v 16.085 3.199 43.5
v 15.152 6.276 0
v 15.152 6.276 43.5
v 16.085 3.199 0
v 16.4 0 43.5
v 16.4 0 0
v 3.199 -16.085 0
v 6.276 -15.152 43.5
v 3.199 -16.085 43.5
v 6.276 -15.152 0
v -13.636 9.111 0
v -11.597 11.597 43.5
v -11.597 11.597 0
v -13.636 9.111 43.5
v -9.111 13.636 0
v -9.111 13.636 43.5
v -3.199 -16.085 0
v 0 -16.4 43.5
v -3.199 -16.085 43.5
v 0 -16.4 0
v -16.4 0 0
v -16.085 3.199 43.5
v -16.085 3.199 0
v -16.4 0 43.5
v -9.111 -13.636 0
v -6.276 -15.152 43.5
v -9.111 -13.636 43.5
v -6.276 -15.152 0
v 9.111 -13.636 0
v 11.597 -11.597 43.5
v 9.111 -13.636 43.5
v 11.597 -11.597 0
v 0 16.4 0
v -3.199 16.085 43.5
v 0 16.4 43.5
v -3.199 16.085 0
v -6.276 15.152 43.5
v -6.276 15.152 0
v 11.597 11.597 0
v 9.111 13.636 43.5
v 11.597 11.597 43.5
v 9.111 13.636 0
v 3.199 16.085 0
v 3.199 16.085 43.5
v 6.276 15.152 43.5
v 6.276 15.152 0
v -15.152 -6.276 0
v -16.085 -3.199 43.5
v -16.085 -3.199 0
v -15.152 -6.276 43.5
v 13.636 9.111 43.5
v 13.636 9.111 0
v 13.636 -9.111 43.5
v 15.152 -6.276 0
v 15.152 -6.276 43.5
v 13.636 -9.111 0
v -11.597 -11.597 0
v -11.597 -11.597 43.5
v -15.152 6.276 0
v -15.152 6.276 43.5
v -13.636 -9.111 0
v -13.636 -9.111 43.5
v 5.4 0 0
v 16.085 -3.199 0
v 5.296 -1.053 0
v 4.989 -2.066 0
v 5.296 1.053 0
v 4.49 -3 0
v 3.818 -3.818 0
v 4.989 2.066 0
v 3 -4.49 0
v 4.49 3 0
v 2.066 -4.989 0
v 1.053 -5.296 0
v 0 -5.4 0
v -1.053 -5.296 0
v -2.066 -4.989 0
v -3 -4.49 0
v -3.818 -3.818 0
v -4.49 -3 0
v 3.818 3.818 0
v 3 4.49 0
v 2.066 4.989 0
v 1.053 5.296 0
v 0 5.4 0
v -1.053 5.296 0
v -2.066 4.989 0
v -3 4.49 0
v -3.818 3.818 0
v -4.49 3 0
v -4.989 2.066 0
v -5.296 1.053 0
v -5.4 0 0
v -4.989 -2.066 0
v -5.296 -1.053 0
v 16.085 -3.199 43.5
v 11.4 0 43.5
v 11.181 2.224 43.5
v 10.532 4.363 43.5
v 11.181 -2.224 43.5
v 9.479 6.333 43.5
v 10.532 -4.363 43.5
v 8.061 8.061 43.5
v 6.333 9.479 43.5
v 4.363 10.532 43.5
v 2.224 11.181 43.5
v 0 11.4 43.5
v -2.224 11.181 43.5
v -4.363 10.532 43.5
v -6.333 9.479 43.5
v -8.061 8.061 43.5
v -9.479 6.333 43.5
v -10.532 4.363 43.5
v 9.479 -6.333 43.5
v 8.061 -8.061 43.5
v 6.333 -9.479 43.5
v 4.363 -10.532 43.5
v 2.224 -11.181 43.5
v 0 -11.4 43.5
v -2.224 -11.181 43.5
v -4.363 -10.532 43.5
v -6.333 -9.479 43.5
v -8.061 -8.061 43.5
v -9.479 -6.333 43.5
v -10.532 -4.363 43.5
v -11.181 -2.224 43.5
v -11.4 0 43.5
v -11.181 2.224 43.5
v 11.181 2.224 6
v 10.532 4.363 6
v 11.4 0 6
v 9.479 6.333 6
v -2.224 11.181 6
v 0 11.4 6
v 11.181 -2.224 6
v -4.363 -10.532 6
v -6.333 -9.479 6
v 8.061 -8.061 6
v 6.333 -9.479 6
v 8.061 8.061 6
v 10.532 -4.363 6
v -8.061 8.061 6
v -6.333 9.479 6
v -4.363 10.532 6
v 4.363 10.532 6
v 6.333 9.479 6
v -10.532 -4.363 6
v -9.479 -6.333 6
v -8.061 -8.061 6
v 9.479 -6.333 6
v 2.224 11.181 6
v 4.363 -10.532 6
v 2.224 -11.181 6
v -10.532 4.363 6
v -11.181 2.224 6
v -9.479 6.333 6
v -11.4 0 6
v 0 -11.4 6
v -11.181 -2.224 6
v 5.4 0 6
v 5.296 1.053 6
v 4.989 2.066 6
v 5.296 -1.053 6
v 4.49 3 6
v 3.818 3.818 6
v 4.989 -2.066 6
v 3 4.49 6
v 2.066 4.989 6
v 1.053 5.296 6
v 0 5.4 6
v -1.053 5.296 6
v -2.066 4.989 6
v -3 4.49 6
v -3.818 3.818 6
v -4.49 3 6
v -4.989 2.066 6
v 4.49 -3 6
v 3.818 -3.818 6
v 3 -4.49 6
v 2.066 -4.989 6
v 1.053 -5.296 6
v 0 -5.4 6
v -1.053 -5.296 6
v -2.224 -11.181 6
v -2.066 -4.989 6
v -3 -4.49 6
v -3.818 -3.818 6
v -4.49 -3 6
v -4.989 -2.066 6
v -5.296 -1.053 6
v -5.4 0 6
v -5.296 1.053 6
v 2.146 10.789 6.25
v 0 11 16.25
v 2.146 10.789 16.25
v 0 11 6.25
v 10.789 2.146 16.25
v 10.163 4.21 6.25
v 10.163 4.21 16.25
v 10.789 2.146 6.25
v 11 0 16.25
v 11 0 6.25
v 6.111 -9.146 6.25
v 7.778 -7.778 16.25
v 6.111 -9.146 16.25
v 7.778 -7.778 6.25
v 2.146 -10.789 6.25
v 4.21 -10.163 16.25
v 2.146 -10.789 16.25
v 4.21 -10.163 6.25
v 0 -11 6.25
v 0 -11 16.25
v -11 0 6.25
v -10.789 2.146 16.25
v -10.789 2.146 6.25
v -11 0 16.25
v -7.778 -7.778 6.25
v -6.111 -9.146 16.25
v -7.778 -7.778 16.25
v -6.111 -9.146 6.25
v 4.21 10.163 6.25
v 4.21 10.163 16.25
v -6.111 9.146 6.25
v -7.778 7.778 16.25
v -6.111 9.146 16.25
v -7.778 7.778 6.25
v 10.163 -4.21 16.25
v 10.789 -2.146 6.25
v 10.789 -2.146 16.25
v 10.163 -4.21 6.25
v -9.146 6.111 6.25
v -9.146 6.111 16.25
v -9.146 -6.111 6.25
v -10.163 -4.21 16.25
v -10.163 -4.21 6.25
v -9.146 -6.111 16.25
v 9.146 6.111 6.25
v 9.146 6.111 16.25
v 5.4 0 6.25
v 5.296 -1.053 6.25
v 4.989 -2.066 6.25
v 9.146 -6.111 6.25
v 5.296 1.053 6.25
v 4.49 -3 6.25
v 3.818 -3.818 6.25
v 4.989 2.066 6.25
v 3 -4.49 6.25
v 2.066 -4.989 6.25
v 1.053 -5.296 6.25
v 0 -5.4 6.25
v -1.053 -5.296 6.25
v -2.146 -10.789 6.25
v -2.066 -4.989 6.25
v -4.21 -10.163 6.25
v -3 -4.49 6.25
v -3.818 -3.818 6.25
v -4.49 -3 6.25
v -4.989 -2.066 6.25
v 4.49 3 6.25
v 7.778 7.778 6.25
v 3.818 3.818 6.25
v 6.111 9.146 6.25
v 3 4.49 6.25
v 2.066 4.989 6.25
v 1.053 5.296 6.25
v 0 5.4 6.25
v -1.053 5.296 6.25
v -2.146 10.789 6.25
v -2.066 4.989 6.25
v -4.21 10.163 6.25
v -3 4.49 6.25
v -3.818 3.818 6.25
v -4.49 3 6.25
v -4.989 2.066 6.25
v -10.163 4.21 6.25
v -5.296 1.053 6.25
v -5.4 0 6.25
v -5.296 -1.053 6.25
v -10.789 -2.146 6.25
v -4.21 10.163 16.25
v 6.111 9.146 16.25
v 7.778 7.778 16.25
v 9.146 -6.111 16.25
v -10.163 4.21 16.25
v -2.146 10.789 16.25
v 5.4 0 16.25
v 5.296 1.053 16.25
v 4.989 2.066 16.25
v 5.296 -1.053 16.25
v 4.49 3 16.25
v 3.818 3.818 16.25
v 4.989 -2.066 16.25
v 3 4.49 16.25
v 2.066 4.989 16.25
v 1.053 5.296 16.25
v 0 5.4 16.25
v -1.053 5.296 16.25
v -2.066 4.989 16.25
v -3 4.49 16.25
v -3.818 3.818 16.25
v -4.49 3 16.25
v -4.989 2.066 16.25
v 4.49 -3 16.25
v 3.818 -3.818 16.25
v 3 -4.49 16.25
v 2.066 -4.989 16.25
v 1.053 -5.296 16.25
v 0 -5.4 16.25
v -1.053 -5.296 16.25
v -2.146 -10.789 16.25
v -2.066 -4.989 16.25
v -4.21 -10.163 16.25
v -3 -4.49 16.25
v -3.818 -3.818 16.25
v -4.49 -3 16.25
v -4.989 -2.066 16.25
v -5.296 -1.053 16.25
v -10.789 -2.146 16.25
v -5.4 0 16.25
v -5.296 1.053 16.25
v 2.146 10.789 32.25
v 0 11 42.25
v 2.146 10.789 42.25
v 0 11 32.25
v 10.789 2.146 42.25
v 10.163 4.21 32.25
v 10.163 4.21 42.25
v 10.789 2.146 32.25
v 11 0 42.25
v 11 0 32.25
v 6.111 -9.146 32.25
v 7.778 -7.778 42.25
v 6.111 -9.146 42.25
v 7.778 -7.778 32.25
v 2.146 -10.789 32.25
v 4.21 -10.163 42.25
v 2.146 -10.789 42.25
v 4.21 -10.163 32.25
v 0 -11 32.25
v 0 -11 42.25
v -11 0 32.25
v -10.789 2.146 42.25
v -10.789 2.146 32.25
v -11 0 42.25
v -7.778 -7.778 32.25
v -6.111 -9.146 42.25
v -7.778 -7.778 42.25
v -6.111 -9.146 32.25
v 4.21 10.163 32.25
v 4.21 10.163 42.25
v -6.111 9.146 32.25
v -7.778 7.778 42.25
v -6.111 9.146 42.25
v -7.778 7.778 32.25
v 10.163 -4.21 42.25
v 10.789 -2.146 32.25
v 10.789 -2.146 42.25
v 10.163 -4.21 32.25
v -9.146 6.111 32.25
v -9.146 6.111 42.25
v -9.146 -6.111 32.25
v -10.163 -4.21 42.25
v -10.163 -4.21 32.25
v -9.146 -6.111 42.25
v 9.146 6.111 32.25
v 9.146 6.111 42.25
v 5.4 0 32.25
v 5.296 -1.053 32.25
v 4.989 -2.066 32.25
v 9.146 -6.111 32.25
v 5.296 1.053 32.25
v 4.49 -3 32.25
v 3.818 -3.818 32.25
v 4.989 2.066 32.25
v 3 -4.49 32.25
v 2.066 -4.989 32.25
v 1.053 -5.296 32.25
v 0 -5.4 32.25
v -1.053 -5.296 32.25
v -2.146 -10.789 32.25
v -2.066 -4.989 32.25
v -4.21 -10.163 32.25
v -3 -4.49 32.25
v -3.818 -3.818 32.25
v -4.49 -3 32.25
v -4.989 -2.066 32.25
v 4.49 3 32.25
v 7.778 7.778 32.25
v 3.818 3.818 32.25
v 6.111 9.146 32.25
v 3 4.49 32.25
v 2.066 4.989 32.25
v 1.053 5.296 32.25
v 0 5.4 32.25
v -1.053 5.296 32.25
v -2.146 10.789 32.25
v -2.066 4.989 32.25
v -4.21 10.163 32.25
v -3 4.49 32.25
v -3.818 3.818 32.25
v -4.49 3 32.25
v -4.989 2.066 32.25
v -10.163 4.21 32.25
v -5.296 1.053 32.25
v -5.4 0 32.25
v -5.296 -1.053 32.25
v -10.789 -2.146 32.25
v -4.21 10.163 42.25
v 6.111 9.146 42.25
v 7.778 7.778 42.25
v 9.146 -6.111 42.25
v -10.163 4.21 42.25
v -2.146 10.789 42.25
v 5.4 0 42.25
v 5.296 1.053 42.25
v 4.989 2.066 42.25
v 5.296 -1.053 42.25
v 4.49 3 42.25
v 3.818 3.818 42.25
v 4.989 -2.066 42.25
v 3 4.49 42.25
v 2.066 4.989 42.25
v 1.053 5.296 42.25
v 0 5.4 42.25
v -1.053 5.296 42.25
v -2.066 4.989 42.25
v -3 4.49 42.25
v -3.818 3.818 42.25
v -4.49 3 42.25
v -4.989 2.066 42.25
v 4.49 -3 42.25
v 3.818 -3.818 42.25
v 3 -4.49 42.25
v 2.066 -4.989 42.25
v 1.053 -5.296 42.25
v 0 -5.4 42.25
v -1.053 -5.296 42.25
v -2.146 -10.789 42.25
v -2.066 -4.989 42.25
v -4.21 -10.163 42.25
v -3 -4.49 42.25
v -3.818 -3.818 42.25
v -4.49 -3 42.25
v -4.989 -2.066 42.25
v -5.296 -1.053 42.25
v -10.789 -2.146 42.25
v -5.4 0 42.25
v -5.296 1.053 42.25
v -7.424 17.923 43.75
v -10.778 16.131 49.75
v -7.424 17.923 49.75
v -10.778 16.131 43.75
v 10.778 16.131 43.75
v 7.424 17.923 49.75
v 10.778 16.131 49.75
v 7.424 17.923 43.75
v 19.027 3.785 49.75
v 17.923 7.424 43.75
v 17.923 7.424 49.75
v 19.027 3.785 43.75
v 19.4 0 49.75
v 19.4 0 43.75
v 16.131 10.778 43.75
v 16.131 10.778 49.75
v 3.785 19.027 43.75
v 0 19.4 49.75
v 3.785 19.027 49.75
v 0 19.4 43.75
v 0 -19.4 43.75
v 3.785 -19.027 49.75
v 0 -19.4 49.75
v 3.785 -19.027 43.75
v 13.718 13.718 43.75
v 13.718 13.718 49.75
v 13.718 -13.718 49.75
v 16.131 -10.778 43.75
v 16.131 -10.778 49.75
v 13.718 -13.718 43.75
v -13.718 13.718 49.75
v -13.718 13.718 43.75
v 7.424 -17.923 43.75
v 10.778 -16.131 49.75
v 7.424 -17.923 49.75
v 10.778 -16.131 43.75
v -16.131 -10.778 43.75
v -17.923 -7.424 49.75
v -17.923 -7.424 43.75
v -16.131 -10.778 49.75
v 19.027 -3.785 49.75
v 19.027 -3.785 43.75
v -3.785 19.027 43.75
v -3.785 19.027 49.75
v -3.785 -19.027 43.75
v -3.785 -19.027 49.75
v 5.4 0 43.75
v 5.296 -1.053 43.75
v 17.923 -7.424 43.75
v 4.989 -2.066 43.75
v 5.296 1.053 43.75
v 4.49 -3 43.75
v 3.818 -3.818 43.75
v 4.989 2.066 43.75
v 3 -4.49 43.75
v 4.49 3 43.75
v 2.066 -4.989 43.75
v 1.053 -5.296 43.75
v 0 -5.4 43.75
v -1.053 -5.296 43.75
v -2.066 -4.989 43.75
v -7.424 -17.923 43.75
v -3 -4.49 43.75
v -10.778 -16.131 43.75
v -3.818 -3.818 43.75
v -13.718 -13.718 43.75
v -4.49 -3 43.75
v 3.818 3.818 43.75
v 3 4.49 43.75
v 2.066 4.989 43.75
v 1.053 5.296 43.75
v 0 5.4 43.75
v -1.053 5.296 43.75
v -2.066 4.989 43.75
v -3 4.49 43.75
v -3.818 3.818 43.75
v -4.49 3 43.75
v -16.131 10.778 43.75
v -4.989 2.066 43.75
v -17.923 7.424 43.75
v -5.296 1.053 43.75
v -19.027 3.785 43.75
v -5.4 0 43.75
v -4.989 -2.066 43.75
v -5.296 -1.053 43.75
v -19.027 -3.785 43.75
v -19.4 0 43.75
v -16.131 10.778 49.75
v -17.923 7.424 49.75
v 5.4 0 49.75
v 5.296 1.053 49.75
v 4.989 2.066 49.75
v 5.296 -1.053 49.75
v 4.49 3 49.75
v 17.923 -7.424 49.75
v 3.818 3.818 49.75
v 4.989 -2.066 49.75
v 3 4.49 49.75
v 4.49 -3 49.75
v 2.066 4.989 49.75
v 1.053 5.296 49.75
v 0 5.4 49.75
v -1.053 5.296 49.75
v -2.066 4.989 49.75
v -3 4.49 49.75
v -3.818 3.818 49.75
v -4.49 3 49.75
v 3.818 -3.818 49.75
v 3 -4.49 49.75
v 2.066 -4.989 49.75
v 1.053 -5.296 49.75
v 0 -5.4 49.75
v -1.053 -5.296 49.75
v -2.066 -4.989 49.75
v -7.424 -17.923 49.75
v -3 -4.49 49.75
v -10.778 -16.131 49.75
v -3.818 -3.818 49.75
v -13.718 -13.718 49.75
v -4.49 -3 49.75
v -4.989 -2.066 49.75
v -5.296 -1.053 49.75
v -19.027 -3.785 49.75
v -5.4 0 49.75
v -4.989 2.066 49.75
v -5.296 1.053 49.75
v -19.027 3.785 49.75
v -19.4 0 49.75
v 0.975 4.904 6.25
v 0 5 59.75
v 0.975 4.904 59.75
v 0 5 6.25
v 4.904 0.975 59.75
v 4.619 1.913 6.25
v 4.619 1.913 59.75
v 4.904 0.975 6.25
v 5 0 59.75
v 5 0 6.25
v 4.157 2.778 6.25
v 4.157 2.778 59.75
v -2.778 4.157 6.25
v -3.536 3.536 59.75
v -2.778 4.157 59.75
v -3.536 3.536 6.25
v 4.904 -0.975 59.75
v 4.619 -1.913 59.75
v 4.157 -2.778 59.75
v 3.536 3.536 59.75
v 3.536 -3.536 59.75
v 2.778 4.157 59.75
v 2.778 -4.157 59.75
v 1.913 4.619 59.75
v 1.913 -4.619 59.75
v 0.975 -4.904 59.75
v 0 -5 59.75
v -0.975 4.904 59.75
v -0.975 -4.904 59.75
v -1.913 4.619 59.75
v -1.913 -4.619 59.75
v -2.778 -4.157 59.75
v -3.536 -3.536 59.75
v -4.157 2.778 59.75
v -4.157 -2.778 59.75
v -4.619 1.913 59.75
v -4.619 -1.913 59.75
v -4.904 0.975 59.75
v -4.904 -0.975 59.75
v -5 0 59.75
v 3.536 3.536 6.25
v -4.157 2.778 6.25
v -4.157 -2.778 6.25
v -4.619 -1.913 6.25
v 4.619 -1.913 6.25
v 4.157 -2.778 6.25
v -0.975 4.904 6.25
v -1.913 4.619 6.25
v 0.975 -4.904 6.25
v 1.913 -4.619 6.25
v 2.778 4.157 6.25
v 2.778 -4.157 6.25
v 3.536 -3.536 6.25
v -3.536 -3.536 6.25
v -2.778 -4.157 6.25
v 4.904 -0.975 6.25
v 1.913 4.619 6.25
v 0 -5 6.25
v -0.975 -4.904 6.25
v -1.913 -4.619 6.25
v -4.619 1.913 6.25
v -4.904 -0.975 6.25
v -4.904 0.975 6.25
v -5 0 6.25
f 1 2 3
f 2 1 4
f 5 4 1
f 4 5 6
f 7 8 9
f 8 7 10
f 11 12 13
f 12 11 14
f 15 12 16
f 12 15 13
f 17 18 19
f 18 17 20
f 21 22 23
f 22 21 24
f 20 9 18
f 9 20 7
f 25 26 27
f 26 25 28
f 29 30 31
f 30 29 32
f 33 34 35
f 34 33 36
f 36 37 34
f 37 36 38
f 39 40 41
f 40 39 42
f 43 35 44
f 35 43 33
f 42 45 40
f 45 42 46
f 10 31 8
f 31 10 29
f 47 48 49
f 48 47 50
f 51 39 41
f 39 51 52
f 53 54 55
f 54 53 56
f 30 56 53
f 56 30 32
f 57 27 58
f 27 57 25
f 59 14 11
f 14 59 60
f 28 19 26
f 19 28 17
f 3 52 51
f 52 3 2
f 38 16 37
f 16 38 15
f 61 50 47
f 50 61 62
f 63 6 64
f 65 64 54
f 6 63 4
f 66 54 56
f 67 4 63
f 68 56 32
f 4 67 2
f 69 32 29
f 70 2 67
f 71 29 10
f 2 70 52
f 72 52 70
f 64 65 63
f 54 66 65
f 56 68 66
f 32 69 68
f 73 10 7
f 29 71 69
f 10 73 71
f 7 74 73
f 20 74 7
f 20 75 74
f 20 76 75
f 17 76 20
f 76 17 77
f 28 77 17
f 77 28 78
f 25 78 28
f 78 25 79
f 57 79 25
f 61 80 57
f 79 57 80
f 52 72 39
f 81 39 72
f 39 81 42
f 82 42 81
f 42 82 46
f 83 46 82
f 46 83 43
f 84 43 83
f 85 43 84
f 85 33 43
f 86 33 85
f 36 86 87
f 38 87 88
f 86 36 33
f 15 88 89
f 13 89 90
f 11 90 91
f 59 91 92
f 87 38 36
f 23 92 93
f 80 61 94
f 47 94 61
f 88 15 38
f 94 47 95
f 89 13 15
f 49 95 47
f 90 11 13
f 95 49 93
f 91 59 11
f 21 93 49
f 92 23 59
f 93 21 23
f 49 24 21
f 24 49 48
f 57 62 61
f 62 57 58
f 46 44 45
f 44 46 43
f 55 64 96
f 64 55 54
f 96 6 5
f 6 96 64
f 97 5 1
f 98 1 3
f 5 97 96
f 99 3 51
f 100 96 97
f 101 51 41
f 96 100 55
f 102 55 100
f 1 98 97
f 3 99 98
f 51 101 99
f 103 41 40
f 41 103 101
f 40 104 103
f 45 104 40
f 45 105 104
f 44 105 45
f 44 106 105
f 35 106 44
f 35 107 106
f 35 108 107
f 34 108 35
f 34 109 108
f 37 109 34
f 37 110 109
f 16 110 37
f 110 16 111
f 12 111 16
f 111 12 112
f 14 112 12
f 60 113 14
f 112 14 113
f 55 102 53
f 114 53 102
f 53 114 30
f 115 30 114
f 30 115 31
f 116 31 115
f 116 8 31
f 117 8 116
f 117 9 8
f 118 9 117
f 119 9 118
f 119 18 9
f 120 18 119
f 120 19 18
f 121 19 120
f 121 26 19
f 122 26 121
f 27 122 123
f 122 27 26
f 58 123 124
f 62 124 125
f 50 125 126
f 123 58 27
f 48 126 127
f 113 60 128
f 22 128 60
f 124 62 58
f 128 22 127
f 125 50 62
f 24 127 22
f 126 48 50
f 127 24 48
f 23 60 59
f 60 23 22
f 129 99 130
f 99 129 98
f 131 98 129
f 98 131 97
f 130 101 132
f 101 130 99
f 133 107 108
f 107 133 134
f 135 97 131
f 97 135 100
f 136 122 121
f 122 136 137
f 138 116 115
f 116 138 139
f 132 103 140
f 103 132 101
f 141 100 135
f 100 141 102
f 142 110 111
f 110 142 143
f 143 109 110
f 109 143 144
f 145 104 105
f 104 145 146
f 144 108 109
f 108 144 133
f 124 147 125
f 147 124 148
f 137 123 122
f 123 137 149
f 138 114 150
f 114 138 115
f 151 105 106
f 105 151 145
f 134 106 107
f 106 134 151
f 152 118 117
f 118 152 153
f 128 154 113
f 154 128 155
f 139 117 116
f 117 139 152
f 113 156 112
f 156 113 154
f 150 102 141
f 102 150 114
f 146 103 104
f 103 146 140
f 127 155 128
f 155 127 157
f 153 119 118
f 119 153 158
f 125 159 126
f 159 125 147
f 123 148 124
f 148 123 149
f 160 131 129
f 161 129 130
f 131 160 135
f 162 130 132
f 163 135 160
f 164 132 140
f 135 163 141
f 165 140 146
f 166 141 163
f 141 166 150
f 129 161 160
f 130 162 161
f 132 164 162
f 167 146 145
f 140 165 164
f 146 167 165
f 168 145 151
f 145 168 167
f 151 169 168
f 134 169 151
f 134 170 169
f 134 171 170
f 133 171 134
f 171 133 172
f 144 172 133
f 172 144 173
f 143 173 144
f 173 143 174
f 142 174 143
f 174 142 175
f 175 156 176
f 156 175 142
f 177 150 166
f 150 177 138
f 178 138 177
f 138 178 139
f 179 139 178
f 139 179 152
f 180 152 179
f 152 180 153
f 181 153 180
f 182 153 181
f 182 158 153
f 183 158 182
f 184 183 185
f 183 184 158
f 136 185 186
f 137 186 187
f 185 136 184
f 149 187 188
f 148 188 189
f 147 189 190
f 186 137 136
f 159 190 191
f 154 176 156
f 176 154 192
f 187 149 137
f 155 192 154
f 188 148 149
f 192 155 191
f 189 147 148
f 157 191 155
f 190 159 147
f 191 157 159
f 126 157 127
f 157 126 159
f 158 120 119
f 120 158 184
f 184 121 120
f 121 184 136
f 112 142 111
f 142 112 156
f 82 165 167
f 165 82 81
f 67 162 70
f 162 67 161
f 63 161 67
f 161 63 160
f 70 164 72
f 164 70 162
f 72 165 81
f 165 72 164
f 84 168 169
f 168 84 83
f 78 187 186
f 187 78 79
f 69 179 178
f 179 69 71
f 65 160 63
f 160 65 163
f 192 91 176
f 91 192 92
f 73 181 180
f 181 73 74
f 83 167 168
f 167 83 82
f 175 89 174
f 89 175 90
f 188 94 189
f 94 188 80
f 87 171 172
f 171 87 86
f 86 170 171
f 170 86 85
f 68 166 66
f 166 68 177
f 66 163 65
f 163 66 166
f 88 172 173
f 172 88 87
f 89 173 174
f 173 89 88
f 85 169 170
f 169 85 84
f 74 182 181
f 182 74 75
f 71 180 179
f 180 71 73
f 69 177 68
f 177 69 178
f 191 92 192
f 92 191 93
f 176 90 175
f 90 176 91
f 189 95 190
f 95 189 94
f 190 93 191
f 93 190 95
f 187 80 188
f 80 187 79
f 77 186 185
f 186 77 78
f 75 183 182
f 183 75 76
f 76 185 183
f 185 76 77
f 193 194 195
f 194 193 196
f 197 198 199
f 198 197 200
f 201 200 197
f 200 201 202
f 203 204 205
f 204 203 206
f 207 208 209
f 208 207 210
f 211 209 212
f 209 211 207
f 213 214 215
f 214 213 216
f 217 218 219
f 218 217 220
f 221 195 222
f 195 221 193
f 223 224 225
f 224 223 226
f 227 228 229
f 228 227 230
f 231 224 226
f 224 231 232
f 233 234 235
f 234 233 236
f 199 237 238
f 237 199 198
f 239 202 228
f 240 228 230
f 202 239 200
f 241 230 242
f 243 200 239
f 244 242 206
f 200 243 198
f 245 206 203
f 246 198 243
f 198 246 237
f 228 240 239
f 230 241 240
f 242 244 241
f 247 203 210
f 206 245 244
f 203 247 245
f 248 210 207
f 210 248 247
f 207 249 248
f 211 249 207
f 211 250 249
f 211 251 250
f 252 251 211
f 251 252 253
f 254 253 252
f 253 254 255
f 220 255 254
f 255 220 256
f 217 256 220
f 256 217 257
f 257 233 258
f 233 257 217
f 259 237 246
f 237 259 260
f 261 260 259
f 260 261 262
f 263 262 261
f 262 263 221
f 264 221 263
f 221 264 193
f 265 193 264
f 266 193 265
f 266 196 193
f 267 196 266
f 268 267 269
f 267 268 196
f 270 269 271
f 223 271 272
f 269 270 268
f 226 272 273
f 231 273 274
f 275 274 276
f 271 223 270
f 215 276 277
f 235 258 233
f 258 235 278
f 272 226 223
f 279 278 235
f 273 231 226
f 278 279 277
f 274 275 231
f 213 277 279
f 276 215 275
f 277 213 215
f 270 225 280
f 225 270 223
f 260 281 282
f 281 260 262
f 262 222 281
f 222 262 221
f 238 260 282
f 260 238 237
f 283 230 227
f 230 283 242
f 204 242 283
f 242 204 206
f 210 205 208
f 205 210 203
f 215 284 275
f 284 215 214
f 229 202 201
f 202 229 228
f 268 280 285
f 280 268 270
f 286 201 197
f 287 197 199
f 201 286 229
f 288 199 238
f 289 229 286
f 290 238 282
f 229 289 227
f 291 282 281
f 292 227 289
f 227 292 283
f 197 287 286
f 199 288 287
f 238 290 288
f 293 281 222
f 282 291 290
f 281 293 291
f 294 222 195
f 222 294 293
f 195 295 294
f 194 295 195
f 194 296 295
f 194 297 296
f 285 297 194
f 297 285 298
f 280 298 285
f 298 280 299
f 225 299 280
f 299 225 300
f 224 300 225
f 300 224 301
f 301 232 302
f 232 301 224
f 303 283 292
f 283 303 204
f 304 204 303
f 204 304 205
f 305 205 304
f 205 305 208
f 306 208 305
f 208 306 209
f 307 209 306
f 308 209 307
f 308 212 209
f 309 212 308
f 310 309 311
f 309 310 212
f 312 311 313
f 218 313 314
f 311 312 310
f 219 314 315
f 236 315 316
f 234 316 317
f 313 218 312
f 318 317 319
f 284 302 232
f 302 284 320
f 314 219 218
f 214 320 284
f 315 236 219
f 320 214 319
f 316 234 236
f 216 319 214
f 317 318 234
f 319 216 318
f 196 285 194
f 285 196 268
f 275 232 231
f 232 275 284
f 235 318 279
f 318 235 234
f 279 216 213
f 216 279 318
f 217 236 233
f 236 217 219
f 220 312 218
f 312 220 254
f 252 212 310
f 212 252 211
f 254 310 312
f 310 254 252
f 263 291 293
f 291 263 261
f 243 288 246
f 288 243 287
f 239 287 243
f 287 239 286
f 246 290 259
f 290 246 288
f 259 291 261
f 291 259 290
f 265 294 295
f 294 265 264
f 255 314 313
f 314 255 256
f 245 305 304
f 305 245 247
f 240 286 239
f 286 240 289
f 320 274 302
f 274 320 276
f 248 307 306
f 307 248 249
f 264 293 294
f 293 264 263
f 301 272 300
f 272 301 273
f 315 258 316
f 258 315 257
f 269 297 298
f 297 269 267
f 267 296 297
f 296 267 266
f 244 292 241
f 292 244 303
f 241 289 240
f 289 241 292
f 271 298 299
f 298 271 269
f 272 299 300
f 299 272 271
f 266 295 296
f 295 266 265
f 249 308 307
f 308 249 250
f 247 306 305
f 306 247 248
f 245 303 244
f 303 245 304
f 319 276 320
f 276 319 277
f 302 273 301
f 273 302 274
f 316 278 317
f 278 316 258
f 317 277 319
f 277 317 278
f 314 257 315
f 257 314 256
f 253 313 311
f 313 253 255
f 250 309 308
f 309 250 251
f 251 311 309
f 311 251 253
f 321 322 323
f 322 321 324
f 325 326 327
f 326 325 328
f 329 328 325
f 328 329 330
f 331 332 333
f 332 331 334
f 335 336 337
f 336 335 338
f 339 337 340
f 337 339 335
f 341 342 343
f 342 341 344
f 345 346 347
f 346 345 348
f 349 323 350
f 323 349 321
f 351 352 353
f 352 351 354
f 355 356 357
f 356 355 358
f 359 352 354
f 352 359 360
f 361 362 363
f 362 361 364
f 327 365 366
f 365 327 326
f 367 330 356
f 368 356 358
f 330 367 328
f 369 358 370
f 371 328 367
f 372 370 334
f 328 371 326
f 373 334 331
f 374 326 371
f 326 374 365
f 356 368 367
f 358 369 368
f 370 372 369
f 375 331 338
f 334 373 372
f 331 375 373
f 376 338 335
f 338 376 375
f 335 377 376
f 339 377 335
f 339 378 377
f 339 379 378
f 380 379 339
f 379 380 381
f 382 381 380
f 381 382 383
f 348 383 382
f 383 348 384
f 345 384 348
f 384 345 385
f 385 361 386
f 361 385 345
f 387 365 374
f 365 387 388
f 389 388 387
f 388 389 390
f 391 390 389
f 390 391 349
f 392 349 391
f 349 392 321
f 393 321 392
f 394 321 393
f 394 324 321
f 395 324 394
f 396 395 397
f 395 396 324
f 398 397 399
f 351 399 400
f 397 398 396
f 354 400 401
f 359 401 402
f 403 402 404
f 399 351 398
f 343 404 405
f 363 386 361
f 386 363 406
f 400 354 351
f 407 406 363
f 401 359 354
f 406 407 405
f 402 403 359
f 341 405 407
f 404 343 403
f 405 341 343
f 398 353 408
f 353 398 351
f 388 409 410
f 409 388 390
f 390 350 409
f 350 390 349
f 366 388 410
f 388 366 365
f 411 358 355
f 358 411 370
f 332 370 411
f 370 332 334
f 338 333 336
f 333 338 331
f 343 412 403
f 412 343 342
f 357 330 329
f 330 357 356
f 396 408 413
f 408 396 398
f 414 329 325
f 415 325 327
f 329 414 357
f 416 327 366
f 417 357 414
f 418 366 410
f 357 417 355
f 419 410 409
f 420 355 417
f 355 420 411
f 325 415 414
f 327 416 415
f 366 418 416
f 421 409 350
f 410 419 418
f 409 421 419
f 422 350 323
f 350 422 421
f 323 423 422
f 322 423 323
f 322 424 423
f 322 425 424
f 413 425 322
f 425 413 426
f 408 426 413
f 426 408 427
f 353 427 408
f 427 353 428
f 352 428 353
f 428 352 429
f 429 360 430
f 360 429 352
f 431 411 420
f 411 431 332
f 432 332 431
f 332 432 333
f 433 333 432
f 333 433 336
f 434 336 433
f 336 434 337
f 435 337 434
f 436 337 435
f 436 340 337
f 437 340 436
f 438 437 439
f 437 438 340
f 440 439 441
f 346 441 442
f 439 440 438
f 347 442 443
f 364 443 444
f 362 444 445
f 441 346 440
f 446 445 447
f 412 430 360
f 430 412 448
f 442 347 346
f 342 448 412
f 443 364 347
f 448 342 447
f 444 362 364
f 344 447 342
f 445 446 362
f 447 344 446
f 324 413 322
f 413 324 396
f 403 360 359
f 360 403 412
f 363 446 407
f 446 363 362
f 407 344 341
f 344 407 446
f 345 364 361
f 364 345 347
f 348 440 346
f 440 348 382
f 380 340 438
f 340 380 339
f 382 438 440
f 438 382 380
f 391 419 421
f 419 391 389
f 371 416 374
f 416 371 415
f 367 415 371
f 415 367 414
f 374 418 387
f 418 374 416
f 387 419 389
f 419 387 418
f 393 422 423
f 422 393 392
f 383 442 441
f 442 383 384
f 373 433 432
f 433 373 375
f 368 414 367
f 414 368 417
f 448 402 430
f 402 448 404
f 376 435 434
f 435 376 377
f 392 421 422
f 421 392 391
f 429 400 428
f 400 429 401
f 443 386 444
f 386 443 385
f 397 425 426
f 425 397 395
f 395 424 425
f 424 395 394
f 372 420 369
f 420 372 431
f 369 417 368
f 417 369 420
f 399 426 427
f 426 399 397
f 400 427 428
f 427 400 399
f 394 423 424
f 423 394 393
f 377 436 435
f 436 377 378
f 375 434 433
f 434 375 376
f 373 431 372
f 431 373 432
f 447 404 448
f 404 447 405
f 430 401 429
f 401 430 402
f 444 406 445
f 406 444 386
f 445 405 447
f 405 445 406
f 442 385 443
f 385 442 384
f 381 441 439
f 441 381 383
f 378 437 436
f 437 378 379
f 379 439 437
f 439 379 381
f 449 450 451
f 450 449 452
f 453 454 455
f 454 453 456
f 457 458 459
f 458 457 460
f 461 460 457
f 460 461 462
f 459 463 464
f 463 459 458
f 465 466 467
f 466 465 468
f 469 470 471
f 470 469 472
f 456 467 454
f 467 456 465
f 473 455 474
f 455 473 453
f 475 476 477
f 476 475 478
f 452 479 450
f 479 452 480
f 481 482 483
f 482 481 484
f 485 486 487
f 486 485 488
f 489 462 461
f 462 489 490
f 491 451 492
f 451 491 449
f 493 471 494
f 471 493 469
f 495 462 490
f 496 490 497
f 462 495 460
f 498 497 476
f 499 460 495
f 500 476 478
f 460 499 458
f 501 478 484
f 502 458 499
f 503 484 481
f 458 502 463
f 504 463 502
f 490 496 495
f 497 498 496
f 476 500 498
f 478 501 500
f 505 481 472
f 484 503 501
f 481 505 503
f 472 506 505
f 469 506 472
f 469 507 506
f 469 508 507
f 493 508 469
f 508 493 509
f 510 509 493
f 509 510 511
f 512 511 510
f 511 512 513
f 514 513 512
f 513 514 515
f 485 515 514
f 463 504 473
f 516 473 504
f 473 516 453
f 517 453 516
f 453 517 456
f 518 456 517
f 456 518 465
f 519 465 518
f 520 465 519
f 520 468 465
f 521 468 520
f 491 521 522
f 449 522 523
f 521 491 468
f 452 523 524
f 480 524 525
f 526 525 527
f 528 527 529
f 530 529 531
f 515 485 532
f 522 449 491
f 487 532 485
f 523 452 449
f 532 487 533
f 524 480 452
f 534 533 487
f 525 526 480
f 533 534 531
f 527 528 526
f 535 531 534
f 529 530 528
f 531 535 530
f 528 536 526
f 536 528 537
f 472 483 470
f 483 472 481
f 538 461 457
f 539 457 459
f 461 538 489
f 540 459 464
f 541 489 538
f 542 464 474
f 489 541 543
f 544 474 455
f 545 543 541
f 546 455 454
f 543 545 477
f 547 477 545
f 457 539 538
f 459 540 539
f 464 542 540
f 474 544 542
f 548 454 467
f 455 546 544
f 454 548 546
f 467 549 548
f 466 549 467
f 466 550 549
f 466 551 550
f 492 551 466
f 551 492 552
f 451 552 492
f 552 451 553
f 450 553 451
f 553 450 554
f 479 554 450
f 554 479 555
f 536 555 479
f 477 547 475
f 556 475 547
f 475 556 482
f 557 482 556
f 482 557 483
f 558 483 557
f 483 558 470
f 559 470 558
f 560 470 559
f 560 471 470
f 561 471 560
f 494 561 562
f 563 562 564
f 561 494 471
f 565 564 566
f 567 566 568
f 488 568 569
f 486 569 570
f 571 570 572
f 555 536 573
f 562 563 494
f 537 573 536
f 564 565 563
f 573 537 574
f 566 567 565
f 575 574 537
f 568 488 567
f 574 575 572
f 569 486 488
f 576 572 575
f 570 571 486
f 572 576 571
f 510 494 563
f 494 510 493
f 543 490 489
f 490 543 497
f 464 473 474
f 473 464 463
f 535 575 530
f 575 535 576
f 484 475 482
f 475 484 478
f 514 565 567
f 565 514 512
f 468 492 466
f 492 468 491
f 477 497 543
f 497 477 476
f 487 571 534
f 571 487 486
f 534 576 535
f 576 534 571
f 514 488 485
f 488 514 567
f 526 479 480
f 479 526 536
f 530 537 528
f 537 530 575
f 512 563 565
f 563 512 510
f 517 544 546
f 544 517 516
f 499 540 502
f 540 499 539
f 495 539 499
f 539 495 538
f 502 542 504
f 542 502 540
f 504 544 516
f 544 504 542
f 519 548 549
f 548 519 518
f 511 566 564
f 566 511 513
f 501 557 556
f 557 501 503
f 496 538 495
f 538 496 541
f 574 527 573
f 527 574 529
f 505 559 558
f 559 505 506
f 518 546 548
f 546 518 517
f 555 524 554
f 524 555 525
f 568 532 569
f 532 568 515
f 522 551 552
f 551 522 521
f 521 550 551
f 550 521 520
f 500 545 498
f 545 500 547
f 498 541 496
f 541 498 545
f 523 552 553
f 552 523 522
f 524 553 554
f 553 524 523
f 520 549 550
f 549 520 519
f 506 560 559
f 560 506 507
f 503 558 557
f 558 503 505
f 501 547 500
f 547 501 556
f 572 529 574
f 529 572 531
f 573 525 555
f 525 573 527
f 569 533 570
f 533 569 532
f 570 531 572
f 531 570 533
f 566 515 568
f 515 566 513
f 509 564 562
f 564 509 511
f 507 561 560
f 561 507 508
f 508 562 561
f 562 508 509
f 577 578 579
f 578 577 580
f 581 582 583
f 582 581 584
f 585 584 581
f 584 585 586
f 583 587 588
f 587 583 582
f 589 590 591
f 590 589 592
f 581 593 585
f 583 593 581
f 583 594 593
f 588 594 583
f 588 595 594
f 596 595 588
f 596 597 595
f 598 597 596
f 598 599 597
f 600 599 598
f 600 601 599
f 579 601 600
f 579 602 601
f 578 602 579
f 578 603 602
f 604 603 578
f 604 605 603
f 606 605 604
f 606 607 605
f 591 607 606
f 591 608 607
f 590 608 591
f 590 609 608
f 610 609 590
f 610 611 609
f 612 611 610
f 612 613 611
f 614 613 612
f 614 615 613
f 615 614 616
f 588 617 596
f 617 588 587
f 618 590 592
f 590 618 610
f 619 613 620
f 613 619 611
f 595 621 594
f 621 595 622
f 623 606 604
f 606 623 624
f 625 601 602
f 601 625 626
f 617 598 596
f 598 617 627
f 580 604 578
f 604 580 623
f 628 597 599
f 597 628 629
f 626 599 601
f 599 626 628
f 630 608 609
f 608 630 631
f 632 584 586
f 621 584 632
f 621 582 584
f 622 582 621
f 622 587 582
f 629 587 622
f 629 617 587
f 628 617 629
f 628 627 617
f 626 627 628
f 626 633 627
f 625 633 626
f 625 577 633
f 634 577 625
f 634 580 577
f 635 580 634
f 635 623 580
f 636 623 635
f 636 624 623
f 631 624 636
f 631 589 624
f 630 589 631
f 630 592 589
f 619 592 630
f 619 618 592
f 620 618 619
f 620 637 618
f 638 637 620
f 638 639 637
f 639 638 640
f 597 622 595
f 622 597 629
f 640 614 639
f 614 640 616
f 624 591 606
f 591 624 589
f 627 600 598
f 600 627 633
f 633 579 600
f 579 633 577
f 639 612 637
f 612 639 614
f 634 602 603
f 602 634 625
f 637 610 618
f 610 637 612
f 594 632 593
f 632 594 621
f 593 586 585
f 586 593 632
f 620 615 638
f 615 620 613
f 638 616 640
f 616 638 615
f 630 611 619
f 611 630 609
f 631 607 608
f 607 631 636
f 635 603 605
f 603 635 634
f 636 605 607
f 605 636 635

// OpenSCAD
$fn = 32;

// ------------------------------------------------------------------------
// Shaft station: cup d32.8 x 43.5 mm, shaft d10
// Every part is its own module, assembly() places every instance.
// ------------------------------------------------------------------------

// --- part 1 ---
module housing_cup() {
  difference() {
    cylinder(h = 43.5, d = 32.8);
    translate([0, 0, 6]) cylinder(h = 38.5, d = 22.8);
    translate([0, 0, -1]) cylinder(h = 8, d = 10.8);
  }
}

// --- part 2 ---
module bearing_lower() {
  difference() {
      translate([0, 0, 0]) cylinder(h = 10, d = 22);
      translate([0, 0, -1]) cylinder(h = 12, d = 10.8);
    }
}

// --- part 3 ---
module bearing_upper() {
  difference() {
      translate([0, 0, 0]) cylinder(h = 10, d = 22);
      translate([0, 0, -1]) cylinder(h = 12, d = 10.8);
    }
}

// --- part 4 ---
module station_shaft() {
  translate([0, 0, -26.75]) cylinder(h = 53.5, d = 10);
}

// --- part 5 ---
module station_cover() {
  difference() {
    cylinder(h = 6, d = 38.8);
    translate([0, 0, -1]) cylinder(h = 8, d = 10.8);
  }
}

// --- assembly ---
module assembly() {
  color([0.80, 0.24, 0.20]) translate([0, 0, 0]) rotate([0, 0, 0]) housing_cup();
  color([0.20, 0.45, 0.75]) translate([0, 0, 6.25]) rotate([0, 0, 0]) bearing_lower();
  color([0.25, 0.62, 0.32]) translate([0, 0, 32.25]) rotate([0, 0, 0]) bearing_upper();
  color([0.92, 0.70, 0.18]) translate([0, 0, 33]) rotate([0, 0, 0]) station_shaft();
  color([0.58, 0.35, 0.70]) translate([0, 0, 43.75]) rotate([0, 0, 0]) station_cover();
}

assembly();
